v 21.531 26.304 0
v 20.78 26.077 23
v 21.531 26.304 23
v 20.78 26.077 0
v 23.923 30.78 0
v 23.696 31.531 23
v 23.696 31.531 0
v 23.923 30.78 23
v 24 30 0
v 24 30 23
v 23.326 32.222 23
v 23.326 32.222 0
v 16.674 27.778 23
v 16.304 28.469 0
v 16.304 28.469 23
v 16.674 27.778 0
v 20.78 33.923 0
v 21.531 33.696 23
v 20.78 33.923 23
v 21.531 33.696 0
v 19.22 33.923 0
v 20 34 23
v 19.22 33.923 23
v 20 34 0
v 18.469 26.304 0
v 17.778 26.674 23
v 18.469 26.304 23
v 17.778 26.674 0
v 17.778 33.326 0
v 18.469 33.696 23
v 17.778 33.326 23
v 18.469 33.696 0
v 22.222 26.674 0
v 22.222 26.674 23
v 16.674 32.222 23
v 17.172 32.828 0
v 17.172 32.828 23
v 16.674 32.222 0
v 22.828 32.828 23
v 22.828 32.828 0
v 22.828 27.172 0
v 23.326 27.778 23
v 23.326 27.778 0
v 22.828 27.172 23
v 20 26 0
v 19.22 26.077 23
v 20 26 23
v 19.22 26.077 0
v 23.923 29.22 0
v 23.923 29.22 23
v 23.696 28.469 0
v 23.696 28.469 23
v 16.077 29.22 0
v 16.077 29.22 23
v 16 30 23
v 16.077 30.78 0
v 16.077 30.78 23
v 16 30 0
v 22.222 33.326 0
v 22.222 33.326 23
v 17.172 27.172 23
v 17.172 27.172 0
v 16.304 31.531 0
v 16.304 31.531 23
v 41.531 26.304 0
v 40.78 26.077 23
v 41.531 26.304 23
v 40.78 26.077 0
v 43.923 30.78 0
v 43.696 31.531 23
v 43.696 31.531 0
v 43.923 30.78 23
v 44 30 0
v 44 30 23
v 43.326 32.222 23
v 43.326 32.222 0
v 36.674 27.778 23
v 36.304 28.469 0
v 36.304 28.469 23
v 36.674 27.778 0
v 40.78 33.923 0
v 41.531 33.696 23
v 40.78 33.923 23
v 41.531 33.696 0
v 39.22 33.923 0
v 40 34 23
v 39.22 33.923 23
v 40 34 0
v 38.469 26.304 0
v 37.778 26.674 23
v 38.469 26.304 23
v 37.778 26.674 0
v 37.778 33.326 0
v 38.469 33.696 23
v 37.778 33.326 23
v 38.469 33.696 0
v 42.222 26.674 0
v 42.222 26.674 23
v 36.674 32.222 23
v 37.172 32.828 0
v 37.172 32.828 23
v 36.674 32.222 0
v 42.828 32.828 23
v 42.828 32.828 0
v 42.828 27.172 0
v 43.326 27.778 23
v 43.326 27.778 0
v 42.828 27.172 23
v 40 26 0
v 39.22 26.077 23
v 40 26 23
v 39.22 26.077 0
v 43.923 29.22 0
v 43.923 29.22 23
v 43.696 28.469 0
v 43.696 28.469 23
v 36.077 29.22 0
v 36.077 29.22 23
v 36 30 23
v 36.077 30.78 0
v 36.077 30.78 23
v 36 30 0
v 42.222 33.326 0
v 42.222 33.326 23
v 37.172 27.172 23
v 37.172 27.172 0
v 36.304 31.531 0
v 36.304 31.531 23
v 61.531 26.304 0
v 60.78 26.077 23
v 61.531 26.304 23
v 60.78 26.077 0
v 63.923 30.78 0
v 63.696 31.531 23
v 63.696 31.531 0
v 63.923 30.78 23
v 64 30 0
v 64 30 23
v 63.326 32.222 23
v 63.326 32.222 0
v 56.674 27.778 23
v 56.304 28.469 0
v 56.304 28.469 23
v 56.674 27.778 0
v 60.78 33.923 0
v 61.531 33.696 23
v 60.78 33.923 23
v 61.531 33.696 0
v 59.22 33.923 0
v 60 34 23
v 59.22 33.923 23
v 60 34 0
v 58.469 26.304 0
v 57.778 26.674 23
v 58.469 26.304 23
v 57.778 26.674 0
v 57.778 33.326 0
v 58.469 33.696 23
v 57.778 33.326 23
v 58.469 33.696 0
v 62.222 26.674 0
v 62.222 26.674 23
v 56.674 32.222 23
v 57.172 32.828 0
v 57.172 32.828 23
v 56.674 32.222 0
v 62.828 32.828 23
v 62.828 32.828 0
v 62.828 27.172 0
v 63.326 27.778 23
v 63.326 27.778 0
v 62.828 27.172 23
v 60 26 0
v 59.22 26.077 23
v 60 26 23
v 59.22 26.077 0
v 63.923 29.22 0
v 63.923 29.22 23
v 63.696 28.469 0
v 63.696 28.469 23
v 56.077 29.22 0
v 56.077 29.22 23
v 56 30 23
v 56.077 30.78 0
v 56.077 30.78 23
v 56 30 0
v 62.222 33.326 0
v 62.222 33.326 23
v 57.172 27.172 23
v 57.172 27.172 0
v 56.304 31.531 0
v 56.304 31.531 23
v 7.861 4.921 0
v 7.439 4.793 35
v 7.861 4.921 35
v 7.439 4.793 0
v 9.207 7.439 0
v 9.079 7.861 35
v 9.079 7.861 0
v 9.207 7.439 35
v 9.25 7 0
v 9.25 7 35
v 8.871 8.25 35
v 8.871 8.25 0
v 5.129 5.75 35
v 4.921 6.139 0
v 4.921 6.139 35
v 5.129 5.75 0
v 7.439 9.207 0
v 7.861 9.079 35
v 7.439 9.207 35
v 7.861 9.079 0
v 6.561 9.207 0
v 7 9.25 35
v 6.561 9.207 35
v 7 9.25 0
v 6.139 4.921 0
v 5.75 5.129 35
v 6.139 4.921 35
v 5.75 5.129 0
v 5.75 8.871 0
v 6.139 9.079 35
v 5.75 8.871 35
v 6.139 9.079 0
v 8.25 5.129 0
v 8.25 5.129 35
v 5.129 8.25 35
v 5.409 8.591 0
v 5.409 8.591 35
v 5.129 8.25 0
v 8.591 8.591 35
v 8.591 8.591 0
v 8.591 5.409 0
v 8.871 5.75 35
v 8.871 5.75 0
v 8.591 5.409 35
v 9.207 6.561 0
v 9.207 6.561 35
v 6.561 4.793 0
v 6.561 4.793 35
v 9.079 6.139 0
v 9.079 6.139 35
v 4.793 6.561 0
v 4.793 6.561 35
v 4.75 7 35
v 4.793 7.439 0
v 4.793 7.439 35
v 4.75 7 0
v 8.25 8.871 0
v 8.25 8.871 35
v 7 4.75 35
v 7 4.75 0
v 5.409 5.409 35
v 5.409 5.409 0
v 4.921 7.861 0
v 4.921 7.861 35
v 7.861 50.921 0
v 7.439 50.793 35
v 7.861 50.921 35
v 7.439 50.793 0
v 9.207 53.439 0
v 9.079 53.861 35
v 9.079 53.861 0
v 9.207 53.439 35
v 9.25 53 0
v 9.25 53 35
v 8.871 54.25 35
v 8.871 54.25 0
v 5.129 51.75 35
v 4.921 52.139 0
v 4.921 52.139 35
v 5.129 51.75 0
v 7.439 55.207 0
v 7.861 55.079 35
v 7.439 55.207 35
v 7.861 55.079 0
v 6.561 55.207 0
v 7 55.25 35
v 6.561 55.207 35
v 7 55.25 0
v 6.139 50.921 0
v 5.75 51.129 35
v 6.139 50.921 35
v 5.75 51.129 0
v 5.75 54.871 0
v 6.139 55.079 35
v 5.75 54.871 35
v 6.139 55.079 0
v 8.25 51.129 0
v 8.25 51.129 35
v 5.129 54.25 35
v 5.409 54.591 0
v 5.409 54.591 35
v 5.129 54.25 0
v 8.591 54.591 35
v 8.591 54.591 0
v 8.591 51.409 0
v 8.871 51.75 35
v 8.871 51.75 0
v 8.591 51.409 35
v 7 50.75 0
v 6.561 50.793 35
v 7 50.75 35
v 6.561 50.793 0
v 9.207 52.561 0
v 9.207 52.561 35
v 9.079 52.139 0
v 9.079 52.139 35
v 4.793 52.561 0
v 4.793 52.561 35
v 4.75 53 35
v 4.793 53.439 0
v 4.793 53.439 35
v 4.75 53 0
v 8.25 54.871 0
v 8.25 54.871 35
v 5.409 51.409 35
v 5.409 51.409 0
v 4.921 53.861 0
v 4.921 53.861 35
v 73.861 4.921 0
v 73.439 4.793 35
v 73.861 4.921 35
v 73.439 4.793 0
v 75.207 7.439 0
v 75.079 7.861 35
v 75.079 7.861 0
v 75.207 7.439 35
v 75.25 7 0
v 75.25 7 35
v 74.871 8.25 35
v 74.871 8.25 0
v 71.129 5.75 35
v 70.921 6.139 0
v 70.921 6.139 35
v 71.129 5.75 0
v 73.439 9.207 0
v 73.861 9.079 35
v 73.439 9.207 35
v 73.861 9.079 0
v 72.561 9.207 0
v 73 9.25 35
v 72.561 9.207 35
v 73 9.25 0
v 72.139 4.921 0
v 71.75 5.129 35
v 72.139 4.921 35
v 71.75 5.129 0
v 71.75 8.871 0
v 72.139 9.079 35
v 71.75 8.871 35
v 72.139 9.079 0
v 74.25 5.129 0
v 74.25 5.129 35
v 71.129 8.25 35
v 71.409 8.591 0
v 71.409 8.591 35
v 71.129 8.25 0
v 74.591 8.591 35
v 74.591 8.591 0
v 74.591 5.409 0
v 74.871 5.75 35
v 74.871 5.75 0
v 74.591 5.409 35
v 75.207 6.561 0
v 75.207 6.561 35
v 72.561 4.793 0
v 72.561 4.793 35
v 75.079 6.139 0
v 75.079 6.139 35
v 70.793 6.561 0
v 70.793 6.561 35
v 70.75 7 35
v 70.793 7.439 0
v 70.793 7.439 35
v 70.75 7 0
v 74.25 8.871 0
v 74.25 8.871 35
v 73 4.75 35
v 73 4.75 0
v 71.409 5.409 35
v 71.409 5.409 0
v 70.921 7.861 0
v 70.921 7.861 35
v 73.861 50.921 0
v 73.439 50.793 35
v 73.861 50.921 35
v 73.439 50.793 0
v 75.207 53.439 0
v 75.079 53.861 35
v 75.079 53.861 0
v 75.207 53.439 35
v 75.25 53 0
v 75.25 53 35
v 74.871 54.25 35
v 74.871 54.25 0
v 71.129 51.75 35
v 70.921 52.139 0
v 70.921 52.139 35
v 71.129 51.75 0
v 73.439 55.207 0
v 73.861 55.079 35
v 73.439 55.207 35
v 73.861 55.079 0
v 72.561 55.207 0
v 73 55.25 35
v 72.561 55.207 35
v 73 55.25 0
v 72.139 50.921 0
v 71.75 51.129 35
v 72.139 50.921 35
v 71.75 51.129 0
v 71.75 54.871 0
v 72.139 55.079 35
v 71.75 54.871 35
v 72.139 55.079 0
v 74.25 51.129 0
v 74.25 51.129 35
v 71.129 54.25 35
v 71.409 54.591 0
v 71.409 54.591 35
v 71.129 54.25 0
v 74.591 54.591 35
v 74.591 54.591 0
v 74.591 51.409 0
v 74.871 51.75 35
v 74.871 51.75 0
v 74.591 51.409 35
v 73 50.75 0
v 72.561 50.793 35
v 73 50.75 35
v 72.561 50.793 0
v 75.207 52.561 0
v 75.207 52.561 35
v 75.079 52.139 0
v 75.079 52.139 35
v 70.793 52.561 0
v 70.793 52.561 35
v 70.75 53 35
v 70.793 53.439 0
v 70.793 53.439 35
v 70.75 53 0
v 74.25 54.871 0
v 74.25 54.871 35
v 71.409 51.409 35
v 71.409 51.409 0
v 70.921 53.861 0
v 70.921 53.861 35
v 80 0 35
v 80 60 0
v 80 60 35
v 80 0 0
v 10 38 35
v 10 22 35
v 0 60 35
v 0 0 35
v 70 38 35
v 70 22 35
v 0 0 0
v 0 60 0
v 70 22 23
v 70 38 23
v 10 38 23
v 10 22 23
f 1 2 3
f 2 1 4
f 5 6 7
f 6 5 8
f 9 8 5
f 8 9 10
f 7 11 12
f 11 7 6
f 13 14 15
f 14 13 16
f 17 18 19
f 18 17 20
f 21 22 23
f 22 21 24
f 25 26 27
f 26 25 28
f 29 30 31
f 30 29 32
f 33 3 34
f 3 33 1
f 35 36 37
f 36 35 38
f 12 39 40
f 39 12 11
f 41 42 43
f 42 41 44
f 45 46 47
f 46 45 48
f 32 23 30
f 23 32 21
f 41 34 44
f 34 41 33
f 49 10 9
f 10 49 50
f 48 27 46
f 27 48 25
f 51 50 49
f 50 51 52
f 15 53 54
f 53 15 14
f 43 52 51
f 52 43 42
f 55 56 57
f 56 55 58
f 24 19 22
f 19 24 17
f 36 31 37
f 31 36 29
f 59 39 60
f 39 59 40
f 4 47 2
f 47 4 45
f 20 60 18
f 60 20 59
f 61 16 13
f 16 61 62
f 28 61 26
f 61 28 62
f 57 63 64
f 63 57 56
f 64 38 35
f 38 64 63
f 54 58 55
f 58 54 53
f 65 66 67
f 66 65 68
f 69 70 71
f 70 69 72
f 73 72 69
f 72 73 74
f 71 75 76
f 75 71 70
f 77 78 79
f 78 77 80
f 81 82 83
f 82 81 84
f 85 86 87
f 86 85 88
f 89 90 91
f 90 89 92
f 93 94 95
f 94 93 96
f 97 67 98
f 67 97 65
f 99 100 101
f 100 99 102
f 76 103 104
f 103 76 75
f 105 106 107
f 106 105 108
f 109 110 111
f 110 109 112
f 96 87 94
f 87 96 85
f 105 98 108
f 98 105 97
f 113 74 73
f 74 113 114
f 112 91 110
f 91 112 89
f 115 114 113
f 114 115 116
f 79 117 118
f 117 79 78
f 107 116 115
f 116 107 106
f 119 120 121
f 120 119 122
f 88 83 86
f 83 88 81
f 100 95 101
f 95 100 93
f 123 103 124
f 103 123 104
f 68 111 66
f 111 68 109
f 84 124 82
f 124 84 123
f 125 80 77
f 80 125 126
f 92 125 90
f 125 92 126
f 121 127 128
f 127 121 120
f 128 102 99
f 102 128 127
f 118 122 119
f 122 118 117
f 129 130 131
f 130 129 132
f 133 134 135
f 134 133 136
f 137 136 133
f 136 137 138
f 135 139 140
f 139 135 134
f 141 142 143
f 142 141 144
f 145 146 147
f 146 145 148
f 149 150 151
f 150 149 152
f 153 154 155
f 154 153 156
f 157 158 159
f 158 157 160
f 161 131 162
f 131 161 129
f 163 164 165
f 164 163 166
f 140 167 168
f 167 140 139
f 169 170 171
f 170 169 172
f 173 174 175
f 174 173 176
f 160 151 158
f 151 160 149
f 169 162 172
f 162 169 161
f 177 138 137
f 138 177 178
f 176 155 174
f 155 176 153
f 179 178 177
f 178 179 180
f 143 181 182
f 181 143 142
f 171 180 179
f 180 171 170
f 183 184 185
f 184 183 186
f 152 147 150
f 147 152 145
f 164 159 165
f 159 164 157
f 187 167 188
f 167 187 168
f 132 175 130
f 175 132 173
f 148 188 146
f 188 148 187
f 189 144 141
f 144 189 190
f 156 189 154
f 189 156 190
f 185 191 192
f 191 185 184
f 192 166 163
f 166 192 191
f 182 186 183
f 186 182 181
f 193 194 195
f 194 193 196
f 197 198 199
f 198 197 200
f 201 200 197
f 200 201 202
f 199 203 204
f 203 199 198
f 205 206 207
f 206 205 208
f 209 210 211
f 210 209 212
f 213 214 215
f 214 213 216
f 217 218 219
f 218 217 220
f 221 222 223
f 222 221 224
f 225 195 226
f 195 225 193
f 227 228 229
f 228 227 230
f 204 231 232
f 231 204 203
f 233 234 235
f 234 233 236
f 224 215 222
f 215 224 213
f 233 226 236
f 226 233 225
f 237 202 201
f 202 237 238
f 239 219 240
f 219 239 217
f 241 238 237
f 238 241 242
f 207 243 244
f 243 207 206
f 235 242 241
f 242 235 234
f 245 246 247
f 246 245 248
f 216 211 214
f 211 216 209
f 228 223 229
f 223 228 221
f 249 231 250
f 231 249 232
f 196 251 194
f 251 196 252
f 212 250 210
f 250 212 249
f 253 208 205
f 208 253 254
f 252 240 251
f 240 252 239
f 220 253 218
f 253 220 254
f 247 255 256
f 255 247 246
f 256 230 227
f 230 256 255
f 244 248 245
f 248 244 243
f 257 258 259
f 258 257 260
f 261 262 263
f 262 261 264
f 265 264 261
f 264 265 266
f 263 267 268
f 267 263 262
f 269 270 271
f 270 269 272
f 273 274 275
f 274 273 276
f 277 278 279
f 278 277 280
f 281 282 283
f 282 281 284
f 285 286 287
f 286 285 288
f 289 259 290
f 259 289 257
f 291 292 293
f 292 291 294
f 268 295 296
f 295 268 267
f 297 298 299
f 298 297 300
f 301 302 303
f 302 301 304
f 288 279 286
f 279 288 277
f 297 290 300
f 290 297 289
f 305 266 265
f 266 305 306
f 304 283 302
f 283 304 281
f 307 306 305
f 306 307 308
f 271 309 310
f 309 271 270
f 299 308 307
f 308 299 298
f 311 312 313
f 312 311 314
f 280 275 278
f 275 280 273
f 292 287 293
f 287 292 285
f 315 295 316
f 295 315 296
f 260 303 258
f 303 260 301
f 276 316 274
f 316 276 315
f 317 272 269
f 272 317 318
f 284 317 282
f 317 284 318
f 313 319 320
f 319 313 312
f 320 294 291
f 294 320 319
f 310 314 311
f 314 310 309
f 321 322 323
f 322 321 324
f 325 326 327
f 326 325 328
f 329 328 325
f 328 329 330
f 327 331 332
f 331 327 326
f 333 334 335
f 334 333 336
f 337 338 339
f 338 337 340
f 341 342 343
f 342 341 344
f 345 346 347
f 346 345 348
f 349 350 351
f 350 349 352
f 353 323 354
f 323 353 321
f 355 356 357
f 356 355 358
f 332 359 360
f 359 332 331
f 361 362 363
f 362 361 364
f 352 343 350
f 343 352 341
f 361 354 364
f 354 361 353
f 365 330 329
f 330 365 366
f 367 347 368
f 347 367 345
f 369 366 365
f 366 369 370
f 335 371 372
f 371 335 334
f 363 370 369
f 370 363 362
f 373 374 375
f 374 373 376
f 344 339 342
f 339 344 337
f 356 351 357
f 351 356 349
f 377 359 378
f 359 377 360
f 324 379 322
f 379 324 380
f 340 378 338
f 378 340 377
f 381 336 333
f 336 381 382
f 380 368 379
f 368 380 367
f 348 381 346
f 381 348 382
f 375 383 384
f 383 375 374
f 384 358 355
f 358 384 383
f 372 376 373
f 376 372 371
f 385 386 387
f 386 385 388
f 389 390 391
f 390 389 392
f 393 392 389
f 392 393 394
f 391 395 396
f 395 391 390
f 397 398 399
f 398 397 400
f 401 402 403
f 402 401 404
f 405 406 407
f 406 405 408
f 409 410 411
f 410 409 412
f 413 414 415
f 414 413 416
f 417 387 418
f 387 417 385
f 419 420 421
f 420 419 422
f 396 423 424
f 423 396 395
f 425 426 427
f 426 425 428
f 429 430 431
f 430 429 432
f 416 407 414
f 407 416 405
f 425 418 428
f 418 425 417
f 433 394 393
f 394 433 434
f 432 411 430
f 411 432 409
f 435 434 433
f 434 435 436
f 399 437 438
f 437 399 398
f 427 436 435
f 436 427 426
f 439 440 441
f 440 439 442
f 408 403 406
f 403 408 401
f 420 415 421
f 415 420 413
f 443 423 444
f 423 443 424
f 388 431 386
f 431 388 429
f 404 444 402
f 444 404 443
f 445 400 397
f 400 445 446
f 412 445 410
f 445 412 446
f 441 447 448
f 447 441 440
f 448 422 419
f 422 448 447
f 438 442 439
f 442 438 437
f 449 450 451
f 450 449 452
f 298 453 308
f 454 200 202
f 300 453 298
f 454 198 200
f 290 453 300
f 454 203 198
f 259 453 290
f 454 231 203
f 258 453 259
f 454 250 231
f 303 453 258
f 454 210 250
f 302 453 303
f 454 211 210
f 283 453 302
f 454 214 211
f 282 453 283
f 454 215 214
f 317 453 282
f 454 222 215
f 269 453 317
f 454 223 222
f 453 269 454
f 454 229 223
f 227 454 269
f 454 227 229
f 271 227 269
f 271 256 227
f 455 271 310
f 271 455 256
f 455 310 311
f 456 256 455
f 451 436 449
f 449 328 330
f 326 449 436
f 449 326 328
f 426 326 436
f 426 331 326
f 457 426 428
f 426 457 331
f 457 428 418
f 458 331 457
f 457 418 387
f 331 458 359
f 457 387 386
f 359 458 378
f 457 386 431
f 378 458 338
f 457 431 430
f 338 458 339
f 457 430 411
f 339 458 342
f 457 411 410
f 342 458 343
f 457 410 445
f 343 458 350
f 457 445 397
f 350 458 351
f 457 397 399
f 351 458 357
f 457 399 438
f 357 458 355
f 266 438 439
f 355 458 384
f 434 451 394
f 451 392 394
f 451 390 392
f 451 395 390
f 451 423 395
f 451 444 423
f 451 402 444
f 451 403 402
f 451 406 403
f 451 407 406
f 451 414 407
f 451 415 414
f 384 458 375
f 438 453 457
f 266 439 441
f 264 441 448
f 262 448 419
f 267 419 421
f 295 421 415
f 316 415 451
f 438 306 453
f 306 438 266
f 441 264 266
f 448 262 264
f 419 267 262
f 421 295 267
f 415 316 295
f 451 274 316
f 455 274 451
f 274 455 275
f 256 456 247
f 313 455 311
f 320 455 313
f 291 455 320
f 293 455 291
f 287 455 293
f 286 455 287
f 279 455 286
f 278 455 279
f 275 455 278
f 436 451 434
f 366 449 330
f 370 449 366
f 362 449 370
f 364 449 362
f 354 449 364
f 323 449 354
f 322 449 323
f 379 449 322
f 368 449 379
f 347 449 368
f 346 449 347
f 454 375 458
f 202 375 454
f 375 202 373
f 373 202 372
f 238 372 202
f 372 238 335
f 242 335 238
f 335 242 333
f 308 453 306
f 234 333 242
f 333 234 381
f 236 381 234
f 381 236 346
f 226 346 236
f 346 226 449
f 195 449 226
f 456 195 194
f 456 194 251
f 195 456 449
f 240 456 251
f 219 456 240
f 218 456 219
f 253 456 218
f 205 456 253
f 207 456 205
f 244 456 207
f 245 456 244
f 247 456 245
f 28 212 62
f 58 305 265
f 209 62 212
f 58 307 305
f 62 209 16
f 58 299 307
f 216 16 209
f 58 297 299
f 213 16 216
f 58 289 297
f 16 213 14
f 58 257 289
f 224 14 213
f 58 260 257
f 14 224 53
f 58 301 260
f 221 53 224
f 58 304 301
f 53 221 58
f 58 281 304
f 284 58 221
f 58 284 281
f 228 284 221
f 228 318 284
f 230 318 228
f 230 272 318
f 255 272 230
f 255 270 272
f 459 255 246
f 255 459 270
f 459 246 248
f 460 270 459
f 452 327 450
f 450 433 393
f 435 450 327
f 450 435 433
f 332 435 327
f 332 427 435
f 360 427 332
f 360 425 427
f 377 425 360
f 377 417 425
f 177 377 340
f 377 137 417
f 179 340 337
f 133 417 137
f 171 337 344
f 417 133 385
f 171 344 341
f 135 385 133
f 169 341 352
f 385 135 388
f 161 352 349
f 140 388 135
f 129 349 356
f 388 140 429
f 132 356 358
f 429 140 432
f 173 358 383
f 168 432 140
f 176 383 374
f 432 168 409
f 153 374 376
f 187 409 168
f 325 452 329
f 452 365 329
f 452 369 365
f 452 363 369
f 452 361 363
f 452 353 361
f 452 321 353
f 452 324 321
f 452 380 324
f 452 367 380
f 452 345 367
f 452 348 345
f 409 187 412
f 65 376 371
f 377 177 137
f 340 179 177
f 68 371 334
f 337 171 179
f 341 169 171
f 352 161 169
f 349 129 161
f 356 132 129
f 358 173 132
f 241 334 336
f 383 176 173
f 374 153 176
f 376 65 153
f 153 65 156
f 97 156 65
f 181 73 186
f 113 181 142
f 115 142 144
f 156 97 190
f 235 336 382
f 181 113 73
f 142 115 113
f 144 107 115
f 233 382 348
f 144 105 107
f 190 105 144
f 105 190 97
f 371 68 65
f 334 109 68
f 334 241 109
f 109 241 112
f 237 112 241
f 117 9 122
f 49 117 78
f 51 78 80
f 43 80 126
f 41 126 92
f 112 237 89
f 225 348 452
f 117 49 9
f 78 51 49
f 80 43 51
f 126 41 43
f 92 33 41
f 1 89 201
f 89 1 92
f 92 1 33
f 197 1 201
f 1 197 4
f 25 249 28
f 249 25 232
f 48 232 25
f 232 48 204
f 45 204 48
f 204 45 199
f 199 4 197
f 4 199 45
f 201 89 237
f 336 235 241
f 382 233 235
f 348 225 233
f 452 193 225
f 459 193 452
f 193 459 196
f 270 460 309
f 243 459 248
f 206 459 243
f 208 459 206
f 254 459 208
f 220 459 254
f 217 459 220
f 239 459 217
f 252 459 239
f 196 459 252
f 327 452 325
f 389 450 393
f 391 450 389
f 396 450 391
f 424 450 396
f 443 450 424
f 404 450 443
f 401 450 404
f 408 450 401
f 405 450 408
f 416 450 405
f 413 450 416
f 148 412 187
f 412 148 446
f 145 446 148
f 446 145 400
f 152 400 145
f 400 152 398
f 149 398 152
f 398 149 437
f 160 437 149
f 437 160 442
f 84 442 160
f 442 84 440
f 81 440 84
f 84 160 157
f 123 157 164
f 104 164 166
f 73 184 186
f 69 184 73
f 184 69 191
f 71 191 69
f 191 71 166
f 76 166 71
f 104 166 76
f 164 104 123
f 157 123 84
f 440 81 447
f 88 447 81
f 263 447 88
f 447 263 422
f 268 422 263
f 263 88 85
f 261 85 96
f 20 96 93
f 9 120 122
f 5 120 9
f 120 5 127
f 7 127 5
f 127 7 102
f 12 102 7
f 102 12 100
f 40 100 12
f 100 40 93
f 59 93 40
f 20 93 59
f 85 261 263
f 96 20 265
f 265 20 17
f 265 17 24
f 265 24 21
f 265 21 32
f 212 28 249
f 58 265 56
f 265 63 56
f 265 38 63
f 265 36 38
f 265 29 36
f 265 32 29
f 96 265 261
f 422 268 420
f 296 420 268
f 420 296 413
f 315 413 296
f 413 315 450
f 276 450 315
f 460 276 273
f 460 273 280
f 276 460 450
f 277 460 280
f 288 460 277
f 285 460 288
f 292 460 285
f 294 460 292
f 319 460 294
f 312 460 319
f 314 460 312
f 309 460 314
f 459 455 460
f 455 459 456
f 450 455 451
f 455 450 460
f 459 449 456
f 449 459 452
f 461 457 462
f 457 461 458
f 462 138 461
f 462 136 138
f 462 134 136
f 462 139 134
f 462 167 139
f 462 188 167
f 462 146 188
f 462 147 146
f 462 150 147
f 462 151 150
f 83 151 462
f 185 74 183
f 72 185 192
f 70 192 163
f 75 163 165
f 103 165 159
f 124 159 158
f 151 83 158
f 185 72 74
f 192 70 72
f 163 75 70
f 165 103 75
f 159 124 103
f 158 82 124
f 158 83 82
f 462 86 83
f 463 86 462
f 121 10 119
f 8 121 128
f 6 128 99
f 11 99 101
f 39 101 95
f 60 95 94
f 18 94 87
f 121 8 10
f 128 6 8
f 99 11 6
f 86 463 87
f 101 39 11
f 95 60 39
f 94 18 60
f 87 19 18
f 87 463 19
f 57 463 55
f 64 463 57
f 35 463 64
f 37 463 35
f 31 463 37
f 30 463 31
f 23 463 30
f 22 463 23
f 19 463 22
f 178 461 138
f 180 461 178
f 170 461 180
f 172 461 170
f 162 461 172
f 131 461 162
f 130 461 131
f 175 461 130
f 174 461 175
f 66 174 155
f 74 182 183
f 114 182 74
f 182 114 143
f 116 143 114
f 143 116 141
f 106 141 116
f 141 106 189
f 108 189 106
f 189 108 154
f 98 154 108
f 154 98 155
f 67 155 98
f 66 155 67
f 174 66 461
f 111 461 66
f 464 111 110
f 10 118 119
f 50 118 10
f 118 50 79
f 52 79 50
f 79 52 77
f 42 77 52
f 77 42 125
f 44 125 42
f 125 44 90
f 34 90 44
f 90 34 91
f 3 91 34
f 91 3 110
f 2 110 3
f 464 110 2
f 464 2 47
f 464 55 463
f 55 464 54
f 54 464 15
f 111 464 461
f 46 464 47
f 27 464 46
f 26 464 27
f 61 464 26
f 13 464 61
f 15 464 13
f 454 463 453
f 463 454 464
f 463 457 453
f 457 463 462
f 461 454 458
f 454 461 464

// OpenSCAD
$fn = 32;

// ----------------------------------------------------------------------
// Manifold block: gallery_top manifold
// ----------------------------------------------------------------------

// --- parameters (mm) ---
block_l = 80;             // block length, X
block_w = 60;             // block width, Y
block_h = 35;             // block height, Z
port_d = 8;               // port bore diameter
port_pitch = 20;          // port pitch along X
gallery_d = 16;           // top gallery width, Y
gallery_depth = 12;       // gallery pocket depth
wall_p = 10;              // gallery end wall thickness, X
mnt_d = 4.5;              // mounting hole diameter
mnt_in = 7;               // mounting hole inset from the edges

n_ports = 3;  // ports in the row
port_x0 = (block_l - (n_ports - 1) * port_pitch) / 2;  // first port X

difference() {
  cube([block_l, block_w, block_h]);
  for (i = [0 : n_ports - 1])
    translate([port_x0 + i * port_pitch, block_w / 2, -1])
      cylinder(h = block_h + 2, d = port_d);
  translate([wall_p, block_w / 2 - gallery_d / 2, block_h - gallery_depth])
    cube([block_l - 2 * wall_p, gallery_d, gallery_depth + 1]);
  for (cx = [mnt_in, block_l - mnt_in])
    for (cy = [mnt_in, block_w - mnt_in])
      translate([cx, cy, -1]) cylinder(h = block_h + 2, d = mnt_d);
}
